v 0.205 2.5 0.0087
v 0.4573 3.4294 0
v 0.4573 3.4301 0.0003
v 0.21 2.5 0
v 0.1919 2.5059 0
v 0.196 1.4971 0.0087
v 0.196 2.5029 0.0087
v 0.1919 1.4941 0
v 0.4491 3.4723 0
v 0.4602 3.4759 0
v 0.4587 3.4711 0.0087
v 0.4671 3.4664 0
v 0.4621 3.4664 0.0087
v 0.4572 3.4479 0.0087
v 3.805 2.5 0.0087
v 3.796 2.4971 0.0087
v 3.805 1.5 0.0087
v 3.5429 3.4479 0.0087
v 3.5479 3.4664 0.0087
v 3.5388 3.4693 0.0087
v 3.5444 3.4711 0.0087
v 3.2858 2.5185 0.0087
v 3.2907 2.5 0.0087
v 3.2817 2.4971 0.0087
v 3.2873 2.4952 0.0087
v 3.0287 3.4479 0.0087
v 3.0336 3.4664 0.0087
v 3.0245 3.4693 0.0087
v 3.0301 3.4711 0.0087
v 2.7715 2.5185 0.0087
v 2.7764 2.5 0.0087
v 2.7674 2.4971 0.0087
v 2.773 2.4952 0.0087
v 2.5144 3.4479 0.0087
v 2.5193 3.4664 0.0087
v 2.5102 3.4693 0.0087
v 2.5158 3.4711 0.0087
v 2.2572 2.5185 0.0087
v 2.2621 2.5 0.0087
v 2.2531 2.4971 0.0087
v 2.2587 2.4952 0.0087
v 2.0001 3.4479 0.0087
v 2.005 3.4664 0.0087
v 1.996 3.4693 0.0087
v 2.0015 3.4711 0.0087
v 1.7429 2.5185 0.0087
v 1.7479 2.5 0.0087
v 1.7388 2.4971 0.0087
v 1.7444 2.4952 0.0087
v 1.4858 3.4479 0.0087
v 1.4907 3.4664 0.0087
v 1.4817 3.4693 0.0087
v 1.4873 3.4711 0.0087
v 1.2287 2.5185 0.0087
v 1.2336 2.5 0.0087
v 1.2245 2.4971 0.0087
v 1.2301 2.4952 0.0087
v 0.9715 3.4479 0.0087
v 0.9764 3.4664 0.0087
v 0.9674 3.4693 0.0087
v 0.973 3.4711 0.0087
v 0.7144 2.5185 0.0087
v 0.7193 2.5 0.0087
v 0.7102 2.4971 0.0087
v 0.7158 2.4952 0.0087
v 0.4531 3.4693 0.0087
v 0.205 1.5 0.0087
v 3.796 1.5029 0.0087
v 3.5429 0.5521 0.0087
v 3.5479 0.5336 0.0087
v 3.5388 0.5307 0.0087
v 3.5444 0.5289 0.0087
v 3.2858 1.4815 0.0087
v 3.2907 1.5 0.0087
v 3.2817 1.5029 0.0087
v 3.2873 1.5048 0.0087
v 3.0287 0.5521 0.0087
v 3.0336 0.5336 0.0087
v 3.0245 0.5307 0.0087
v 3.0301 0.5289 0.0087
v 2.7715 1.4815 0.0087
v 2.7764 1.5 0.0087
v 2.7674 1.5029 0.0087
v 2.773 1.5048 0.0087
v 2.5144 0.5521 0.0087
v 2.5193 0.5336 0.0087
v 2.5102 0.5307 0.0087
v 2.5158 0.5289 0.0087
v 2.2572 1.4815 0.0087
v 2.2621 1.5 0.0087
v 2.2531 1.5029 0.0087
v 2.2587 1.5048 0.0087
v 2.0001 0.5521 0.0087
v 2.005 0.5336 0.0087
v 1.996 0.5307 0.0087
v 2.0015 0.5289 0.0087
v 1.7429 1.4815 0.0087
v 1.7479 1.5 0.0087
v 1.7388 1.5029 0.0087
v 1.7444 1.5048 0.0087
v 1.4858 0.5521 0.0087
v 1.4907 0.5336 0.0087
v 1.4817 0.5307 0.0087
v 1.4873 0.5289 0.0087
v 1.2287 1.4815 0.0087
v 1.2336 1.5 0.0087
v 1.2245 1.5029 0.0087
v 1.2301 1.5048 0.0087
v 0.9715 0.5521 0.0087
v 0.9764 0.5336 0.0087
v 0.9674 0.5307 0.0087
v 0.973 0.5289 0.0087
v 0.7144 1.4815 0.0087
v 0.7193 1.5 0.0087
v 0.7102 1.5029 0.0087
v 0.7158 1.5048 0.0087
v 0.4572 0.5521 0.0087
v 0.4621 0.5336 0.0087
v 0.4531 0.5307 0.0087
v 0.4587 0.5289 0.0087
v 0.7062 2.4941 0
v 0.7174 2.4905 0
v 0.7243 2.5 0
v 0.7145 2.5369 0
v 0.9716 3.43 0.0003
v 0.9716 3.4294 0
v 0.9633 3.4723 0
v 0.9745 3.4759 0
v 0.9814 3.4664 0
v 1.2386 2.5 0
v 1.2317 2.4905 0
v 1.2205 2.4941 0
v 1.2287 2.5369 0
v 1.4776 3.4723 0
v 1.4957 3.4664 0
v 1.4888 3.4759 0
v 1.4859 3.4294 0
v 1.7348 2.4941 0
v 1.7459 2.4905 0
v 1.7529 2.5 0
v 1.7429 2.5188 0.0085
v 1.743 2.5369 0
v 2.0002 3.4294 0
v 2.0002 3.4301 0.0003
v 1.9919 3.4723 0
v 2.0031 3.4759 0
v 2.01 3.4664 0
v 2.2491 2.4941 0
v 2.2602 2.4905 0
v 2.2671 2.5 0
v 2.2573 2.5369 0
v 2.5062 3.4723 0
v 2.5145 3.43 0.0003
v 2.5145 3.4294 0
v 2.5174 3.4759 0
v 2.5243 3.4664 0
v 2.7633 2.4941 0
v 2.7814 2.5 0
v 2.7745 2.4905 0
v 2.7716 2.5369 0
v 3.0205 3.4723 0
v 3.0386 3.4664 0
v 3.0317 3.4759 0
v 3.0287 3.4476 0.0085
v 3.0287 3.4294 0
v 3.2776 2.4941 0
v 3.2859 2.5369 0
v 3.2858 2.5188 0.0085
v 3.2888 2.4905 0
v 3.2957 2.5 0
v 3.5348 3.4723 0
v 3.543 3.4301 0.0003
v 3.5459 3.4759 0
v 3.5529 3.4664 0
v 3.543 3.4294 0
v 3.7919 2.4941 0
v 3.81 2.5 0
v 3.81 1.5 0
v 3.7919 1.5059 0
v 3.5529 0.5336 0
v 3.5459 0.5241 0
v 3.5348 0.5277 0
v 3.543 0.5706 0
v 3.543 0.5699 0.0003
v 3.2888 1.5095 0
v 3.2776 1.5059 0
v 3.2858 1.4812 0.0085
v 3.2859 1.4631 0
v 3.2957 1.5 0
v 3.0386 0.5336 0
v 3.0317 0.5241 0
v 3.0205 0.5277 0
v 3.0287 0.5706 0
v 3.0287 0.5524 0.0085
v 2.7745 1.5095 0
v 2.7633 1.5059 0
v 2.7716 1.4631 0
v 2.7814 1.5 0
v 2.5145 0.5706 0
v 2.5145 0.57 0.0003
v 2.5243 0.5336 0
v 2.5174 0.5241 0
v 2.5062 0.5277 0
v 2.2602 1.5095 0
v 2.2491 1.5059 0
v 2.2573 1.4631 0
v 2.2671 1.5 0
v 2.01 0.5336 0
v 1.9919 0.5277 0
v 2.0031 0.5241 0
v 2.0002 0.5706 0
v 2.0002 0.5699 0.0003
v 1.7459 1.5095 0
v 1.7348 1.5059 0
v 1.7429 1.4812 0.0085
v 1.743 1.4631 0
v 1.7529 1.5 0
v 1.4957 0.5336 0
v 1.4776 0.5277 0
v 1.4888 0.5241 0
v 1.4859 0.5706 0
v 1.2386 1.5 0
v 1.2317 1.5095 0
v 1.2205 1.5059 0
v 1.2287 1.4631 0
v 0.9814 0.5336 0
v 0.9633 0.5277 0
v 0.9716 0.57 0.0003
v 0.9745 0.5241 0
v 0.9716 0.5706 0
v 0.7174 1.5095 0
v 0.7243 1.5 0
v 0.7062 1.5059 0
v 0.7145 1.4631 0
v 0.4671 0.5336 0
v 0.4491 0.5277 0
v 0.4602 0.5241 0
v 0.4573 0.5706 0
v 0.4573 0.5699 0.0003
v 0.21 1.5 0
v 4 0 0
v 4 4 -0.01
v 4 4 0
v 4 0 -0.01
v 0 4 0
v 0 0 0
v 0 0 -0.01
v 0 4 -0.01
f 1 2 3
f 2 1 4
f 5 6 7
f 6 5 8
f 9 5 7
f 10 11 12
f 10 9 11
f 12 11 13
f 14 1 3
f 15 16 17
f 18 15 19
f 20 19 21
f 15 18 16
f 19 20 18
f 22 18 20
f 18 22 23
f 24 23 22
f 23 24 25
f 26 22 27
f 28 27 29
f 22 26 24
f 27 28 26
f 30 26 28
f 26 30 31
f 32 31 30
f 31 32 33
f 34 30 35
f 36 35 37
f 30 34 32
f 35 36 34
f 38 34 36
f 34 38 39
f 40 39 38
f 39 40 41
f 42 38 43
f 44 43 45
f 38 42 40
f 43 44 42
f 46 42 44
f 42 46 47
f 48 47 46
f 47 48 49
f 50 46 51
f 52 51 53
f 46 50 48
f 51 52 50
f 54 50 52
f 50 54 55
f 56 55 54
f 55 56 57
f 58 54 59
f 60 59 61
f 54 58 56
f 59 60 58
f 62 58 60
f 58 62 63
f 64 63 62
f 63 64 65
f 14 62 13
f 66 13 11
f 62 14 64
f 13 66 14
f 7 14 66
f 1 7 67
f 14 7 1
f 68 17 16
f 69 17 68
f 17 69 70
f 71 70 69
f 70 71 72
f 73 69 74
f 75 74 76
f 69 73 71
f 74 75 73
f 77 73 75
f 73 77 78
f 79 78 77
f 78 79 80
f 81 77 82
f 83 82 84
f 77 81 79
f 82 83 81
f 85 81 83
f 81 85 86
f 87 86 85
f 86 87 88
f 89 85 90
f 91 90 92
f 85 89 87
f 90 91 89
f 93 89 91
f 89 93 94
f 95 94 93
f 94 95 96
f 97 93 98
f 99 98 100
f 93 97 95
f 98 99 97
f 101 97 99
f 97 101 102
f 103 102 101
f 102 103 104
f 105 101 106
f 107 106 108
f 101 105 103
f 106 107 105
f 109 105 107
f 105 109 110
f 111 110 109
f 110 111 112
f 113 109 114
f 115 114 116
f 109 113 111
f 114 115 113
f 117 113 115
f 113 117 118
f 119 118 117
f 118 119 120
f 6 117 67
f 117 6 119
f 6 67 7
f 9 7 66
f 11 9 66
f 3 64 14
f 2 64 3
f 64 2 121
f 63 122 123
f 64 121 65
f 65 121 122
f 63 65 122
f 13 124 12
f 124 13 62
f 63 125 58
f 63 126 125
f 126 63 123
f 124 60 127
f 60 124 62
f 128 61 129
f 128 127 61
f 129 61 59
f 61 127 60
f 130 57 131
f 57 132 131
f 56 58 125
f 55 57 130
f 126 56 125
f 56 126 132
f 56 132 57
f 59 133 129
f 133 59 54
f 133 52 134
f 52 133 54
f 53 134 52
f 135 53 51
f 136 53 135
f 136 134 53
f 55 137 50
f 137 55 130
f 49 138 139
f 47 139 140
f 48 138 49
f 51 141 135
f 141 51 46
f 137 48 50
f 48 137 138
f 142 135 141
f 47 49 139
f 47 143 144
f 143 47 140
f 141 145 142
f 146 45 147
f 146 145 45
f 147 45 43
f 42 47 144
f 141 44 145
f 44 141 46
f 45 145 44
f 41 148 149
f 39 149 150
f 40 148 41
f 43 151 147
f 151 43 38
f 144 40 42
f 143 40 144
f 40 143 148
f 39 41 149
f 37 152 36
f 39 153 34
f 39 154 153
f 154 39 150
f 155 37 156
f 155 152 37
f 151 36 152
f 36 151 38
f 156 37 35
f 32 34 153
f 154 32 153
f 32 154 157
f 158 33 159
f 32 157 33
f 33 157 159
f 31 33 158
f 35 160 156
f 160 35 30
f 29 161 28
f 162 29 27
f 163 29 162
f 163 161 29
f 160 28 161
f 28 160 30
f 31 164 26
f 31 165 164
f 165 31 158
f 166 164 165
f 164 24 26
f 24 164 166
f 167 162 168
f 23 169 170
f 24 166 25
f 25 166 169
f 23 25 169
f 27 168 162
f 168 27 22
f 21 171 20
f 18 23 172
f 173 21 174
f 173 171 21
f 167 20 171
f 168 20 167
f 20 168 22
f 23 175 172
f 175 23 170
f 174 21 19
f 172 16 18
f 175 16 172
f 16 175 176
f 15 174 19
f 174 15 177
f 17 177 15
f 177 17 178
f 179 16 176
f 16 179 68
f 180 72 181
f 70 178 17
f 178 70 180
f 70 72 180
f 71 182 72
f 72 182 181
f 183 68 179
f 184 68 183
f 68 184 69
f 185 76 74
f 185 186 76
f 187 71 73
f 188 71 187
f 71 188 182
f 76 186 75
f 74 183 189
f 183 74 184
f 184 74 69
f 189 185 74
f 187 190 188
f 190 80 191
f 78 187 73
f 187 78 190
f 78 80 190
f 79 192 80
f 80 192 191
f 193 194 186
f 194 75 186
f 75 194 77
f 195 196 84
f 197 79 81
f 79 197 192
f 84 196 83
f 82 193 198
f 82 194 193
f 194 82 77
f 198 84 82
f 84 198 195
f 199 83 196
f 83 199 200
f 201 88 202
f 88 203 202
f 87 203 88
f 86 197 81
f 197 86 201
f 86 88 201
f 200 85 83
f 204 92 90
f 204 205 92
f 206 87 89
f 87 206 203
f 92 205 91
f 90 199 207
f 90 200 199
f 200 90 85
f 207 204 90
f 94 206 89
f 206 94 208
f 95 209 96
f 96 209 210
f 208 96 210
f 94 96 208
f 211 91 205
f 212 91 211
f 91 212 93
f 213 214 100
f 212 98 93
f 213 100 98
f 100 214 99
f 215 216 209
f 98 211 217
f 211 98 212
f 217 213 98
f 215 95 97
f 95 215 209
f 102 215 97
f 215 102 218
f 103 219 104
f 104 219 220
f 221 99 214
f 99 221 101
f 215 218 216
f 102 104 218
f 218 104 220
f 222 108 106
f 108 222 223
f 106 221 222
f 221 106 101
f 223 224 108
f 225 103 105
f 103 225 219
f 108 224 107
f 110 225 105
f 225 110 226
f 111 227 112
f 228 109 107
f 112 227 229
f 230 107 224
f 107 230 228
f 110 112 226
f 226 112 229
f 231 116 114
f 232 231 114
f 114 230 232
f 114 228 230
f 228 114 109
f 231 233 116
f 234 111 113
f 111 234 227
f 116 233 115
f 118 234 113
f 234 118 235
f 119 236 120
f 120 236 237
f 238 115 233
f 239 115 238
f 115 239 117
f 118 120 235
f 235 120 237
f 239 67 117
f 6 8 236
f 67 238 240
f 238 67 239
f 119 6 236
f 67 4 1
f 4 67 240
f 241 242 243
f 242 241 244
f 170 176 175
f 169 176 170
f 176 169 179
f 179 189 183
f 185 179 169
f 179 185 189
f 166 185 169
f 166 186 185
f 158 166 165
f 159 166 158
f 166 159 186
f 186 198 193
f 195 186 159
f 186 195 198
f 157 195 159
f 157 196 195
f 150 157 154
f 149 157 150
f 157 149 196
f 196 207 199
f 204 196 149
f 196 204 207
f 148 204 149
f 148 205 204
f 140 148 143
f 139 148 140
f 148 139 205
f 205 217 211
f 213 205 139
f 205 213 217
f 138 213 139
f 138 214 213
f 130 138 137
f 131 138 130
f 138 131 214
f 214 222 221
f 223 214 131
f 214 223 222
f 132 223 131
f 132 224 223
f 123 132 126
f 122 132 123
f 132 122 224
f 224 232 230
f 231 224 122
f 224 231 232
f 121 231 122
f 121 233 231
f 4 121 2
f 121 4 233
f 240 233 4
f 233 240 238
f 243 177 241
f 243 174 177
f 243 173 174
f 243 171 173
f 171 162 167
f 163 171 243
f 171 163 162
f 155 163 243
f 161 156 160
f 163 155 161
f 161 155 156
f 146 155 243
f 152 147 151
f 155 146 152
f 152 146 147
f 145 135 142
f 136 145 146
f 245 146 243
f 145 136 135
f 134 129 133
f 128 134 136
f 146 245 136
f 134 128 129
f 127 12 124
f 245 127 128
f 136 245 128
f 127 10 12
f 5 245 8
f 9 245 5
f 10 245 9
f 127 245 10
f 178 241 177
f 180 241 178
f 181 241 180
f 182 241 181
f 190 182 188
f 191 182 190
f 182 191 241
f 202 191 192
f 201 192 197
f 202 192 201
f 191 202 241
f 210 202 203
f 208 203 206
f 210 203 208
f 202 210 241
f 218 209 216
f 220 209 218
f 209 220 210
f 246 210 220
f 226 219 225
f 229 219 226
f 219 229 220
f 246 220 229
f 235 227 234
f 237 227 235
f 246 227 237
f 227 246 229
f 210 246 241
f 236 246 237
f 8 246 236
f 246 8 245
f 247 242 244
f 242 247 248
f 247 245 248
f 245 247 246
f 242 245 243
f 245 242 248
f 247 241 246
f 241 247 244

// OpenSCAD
hull(){
    translate([0.2, 2.5]) sphere(0.01);
    translate([0.45714285714285713, 3.466373401445015]) sphere(0.01);
}
hull(){
    translate([0.45714285714285713, 3.466373401445015]) sphere(0.01);
    translate([0.7142857142857142, 2.5]) sphere(0.01);
}
hull(){
    translate([0.7142857142857142, 2.5]) sphere(0.01);
    translate([0.9714285714285713, 3.466373401445015]) sphere(0.01);
}
hull(){
    translate([0.9714285714285713, 3.466373401445015]) sphere(0.01);
    translate([1.2285714285714284, 2.5]) sphere(0.01);
}
hull(){
    translate([1.2285714285714284, 2.5]) sphere(0.01);
    translate([1.4857142857142855, 3.466373401445015]) sphere(0.01);
}
hull(){
    translate([1.4857142857142855, 3.466373401445015]) sphere(0.01);
    translate([1.7428571428571427, 2.5]) sphere(0.01);
}
hull(){
    translate([1.7428571428571427, 2.5]) sphere(0.01);
    translate([1.9999999999999998, 3.466373401445015]) sphere(0.01);
}
hull(){
    translate([1.9999999999999998, 3.466373401445015]) sphere(0.01);
    translate([2.257142857142857, 2.5]) sphere(0.01);
}
hull(){
    translate([2.257142857142857, 2.5]) sphere(0.01);
    translate([2.5142857142857142, 3.466373401445015]) sphere(0.01);
}
hull(){
    translate([2.5142857142857142, 3.466373401445015]) sphere(0.01);
    translate([2.7714285714285714, 2.5]) sphere(0.01);
}
hull(){
    translate([2.7714285714285714, 2.5]) sphere(0.01);
    translate([3.0285714285714285, 3.466373401445015]) sphere(0.01);
}
hull(){
    translate([3.0285714285714285, 3.466373401445015]) sphere(0.01);
    translate([3.2857142857142856, 2.5]) sphere(0.01);
}
hull(){
    translate([3.2857142857142856, 2.5]) sphere(0.01);
    translate([3.5428571428571427, 3.466373401445015]) sphere(0.01);
}
hull(){
    translate([3.5428571428571427, 3.466373401445015]) sphere(0.01);
    translate([3.8, 2.5]) sphere(0.01);
}
hull(){
    translate([3.8, 2.5]) sphere(0.01);
    translate([3.8, 1.5]) sphere(0.01);
}
hull(){
    translate([3.8, 1.5]) sphere(0.01);
    translate([3.5428571428571427, 0.533626598554985]) sphere(0.01);
}
hull(){
    translate([3.5428571428571427, 0.533626598554985]) sphere(0.01);
    translate([3.2857142857142856, 1.5]) sphere(0.01);
}
hull(){
    translate([3.2857142857142856, 1.5]) sphere(0.01);
    translate([3.0285714285714285, 0.533626598554985]) sphere(0.01);
}
hull(){
    translate([3.0285714285714285, 0.533626598554985]) sphere(0.01);
    translate([2.7714285714285714, 1.5]) sphere(0.01);
}
hull(){
    translate([2.7714285714285714, 1.5]) sphere(0.01);
    translate([2.5142857142857142, 0.533626598554985]) sphere(0.01);
}
hull(){
    translate([2.5142857142857142, 0.533626598554985]) sphere(0.01);
    translate([2.257142857142857, 1.5]) sphere(0.01);
}
hull(){
    translate([2.257142857142857, 1.5]) sphere(0.01);
    translate([2.0, 0.533626598554985]) sphere(0.01);
}
hull(){
    translate([2.0, 0.533626598554985]) sphere(0.01);
    translate([1.7428571428571429, 1.5]) sphere(0.01);
}
hull(){
    translate([1.7428571428571429, 1.5]) sphere(0.01);
    translate([1.4857142857142858, 0.533626598554985]) sphere(0.01);
}
hull(){
    translate([1.4857142857142858, 0.533626598554985]) sphere(0.01);
    translate([1.2285714285714286, 1.5]) sphere(0.01);
}
hull(){
    translate([1.2285714285714286, 1.5]) sphere(0.01);
    translate([0.9714285714285715, 0.533626598554985]) sphere(0.01);
}
hull(){
    translate([0.9714285714285715, 0.533626598554985]) sphere(0.01);
    translate([0.7142857142857144, 1.5]) sphere(0.01);
}
hull(){
    translate([0.7142857142857144, 1.5]) sphere(0.01);
    translate([0.4571428571428573, 0.533626598554985]) sphere(0.01);
}
hull(){
    translate([0.4571428571428573, 0.533626598554985]) sphere(0.01);
    translate([0.20000000000000018, 1.5]) sphere(0.01);
}
hull(){
    translate([0.20000000000000018, 1.5]) sphere(0.01);
    translate([0.2, 2.5]) sphere(0.01);
}
translate([0,0,-0.01]) color([0.1,0.1,0.1]) cube([4,4,0.01]);
